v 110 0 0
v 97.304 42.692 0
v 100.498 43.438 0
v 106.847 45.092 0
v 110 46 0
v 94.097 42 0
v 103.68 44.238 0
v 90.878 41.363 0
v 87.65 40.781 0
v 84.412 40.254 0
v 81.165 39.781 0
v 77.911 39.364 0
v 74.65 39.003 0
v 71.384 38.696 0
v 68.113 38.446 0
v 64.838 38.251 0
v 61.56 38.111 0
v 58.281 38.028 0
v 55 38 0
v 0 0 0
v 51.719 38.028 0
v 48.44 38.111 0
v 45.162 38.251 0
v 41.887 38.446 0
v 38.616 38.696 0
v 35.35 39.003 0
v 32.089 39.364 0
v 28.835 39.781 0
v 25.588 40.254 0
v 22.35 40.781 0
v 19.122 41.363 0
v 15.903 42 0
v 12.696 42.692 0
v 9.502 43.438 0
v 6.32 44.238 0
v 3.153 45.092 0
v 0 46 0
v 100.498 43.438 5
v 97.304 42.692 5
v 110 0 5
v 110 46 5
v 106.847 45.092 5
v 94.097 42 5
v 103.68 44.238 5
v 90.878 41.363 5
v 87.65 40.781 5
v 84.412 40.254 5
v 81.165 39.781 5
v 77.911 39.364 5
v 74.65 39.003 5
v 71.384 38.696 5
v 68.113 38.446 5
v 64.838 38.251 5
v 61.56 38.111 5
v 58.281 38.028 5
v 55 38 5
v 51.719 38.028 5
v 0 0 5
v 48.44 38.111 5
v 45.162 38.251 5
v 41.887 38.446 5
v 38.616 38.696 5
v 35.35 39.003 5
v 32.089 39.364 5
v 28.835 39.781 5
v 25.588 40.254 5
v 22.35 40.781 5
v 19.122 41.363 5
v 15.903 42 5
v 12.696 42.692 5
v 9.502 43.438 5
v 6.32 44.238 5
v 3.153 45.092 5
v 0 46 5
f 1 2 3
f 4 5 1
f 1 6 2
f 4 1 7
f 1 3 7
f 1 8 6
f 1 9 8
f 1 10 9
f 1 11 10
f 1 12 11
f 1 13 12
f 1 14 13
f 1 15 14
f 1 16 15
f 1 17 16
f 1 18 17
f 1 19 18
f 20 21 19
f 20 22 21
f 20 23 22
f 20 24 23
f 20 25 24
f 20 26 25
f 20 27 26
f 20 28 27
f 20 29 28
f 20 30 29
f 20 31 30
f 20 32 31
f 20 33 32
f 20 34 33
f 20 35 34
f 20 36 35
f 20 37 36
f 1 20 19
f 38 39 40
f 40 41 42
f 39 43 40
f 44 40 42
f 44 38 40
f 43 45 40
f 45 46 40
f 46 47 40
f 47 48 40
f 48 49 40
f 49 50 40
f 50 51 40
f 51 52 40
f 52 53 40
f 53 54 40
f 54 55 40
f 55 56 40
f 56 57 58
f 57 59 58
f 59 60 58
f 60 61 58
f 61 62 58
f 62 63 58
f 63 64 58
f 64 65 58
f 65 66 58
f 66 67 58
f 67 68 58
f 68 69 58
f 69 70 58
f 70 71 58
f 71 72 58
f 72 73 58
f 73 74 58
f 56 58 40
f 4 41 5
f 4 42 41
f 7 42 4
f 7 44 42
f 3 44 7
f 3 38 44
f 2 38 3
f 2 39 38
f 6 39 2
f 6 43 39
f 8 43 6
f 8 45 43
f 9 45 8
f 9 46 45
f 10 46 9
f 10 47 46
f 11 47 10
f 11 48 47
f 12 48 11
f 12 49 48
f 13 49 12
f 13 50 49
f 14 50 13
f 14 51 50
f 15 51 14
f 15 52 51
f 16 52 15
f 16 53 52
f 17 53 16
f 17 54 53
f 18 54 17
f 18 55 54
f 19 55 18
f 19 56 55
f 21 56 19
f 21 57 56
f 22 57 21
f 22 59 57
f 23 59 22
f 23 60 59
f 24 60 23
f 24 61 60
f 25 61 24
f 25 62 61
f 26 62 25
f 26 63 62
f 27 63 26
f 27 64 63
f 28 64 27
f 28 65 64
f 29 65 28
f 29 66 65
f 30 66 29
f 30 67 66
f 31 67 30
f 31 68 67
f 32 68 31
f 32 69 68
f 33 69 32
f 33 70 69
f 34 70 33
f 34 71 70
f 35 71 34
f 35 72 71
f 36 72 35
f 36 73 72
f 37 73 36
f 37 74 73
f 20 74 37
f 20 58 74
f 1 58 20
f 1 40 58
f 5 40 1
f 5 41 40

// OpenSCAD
$fn = 32;

// ----------------------------------------------------------------------
// Arc profile plate: notch, 37 points
// ----------------------------------------------------------------------

// --- parameters (mm) ---
bar_l = 110;              // bar length, X
bar_w = 46;               // bar width, Y
notch_depth = 8;          // depth of the arc notch at mid-span
arc_r = 193.06;           // radius of the notch arc
arc_angle = 33.1;         // notch arc angle, degrees
arc_step = 1;             // sampling step of the notch arc, degrees
plate_t = 5;              // plate thickness, Z

profile = [[0, 0], [110, 0], [110, 46], [106.847, 45.092], [103.68, 44.238], [100.498, 43.438], [97.304, 42.692], [94.097, 42], [90.878, 41.363], [87.65, 40.781], [84.412, 40.254], [81.165, 39.781], [77.911, 39.364], [74.65, 39.003], [71.384, 38.696], [68.113, 38.446], [64.838, 38.251], [61.56, 38.111], [58.281, 38.028], [55, 38], [51.719, 38.028], [48.44, 38.111], [45.162, 38.251], [41.887, 38.446], [38.616, 38.696], [35.35, 39.003], [32.089, 39.364], [28.835, 39.781], [25.588, 40.254], [22.35, 40.781], [19.122, 41.363], [15.903, 42], [12.696, 42.692], [9.502, 43.438], [6.32, 44.238], [3.153, 45.092], [0, 46]];  // primary outline, 37 points, counter clockwise

// --- the one profile operation ---
linear_extrude(height = plate_t) polygon(points = profile);
